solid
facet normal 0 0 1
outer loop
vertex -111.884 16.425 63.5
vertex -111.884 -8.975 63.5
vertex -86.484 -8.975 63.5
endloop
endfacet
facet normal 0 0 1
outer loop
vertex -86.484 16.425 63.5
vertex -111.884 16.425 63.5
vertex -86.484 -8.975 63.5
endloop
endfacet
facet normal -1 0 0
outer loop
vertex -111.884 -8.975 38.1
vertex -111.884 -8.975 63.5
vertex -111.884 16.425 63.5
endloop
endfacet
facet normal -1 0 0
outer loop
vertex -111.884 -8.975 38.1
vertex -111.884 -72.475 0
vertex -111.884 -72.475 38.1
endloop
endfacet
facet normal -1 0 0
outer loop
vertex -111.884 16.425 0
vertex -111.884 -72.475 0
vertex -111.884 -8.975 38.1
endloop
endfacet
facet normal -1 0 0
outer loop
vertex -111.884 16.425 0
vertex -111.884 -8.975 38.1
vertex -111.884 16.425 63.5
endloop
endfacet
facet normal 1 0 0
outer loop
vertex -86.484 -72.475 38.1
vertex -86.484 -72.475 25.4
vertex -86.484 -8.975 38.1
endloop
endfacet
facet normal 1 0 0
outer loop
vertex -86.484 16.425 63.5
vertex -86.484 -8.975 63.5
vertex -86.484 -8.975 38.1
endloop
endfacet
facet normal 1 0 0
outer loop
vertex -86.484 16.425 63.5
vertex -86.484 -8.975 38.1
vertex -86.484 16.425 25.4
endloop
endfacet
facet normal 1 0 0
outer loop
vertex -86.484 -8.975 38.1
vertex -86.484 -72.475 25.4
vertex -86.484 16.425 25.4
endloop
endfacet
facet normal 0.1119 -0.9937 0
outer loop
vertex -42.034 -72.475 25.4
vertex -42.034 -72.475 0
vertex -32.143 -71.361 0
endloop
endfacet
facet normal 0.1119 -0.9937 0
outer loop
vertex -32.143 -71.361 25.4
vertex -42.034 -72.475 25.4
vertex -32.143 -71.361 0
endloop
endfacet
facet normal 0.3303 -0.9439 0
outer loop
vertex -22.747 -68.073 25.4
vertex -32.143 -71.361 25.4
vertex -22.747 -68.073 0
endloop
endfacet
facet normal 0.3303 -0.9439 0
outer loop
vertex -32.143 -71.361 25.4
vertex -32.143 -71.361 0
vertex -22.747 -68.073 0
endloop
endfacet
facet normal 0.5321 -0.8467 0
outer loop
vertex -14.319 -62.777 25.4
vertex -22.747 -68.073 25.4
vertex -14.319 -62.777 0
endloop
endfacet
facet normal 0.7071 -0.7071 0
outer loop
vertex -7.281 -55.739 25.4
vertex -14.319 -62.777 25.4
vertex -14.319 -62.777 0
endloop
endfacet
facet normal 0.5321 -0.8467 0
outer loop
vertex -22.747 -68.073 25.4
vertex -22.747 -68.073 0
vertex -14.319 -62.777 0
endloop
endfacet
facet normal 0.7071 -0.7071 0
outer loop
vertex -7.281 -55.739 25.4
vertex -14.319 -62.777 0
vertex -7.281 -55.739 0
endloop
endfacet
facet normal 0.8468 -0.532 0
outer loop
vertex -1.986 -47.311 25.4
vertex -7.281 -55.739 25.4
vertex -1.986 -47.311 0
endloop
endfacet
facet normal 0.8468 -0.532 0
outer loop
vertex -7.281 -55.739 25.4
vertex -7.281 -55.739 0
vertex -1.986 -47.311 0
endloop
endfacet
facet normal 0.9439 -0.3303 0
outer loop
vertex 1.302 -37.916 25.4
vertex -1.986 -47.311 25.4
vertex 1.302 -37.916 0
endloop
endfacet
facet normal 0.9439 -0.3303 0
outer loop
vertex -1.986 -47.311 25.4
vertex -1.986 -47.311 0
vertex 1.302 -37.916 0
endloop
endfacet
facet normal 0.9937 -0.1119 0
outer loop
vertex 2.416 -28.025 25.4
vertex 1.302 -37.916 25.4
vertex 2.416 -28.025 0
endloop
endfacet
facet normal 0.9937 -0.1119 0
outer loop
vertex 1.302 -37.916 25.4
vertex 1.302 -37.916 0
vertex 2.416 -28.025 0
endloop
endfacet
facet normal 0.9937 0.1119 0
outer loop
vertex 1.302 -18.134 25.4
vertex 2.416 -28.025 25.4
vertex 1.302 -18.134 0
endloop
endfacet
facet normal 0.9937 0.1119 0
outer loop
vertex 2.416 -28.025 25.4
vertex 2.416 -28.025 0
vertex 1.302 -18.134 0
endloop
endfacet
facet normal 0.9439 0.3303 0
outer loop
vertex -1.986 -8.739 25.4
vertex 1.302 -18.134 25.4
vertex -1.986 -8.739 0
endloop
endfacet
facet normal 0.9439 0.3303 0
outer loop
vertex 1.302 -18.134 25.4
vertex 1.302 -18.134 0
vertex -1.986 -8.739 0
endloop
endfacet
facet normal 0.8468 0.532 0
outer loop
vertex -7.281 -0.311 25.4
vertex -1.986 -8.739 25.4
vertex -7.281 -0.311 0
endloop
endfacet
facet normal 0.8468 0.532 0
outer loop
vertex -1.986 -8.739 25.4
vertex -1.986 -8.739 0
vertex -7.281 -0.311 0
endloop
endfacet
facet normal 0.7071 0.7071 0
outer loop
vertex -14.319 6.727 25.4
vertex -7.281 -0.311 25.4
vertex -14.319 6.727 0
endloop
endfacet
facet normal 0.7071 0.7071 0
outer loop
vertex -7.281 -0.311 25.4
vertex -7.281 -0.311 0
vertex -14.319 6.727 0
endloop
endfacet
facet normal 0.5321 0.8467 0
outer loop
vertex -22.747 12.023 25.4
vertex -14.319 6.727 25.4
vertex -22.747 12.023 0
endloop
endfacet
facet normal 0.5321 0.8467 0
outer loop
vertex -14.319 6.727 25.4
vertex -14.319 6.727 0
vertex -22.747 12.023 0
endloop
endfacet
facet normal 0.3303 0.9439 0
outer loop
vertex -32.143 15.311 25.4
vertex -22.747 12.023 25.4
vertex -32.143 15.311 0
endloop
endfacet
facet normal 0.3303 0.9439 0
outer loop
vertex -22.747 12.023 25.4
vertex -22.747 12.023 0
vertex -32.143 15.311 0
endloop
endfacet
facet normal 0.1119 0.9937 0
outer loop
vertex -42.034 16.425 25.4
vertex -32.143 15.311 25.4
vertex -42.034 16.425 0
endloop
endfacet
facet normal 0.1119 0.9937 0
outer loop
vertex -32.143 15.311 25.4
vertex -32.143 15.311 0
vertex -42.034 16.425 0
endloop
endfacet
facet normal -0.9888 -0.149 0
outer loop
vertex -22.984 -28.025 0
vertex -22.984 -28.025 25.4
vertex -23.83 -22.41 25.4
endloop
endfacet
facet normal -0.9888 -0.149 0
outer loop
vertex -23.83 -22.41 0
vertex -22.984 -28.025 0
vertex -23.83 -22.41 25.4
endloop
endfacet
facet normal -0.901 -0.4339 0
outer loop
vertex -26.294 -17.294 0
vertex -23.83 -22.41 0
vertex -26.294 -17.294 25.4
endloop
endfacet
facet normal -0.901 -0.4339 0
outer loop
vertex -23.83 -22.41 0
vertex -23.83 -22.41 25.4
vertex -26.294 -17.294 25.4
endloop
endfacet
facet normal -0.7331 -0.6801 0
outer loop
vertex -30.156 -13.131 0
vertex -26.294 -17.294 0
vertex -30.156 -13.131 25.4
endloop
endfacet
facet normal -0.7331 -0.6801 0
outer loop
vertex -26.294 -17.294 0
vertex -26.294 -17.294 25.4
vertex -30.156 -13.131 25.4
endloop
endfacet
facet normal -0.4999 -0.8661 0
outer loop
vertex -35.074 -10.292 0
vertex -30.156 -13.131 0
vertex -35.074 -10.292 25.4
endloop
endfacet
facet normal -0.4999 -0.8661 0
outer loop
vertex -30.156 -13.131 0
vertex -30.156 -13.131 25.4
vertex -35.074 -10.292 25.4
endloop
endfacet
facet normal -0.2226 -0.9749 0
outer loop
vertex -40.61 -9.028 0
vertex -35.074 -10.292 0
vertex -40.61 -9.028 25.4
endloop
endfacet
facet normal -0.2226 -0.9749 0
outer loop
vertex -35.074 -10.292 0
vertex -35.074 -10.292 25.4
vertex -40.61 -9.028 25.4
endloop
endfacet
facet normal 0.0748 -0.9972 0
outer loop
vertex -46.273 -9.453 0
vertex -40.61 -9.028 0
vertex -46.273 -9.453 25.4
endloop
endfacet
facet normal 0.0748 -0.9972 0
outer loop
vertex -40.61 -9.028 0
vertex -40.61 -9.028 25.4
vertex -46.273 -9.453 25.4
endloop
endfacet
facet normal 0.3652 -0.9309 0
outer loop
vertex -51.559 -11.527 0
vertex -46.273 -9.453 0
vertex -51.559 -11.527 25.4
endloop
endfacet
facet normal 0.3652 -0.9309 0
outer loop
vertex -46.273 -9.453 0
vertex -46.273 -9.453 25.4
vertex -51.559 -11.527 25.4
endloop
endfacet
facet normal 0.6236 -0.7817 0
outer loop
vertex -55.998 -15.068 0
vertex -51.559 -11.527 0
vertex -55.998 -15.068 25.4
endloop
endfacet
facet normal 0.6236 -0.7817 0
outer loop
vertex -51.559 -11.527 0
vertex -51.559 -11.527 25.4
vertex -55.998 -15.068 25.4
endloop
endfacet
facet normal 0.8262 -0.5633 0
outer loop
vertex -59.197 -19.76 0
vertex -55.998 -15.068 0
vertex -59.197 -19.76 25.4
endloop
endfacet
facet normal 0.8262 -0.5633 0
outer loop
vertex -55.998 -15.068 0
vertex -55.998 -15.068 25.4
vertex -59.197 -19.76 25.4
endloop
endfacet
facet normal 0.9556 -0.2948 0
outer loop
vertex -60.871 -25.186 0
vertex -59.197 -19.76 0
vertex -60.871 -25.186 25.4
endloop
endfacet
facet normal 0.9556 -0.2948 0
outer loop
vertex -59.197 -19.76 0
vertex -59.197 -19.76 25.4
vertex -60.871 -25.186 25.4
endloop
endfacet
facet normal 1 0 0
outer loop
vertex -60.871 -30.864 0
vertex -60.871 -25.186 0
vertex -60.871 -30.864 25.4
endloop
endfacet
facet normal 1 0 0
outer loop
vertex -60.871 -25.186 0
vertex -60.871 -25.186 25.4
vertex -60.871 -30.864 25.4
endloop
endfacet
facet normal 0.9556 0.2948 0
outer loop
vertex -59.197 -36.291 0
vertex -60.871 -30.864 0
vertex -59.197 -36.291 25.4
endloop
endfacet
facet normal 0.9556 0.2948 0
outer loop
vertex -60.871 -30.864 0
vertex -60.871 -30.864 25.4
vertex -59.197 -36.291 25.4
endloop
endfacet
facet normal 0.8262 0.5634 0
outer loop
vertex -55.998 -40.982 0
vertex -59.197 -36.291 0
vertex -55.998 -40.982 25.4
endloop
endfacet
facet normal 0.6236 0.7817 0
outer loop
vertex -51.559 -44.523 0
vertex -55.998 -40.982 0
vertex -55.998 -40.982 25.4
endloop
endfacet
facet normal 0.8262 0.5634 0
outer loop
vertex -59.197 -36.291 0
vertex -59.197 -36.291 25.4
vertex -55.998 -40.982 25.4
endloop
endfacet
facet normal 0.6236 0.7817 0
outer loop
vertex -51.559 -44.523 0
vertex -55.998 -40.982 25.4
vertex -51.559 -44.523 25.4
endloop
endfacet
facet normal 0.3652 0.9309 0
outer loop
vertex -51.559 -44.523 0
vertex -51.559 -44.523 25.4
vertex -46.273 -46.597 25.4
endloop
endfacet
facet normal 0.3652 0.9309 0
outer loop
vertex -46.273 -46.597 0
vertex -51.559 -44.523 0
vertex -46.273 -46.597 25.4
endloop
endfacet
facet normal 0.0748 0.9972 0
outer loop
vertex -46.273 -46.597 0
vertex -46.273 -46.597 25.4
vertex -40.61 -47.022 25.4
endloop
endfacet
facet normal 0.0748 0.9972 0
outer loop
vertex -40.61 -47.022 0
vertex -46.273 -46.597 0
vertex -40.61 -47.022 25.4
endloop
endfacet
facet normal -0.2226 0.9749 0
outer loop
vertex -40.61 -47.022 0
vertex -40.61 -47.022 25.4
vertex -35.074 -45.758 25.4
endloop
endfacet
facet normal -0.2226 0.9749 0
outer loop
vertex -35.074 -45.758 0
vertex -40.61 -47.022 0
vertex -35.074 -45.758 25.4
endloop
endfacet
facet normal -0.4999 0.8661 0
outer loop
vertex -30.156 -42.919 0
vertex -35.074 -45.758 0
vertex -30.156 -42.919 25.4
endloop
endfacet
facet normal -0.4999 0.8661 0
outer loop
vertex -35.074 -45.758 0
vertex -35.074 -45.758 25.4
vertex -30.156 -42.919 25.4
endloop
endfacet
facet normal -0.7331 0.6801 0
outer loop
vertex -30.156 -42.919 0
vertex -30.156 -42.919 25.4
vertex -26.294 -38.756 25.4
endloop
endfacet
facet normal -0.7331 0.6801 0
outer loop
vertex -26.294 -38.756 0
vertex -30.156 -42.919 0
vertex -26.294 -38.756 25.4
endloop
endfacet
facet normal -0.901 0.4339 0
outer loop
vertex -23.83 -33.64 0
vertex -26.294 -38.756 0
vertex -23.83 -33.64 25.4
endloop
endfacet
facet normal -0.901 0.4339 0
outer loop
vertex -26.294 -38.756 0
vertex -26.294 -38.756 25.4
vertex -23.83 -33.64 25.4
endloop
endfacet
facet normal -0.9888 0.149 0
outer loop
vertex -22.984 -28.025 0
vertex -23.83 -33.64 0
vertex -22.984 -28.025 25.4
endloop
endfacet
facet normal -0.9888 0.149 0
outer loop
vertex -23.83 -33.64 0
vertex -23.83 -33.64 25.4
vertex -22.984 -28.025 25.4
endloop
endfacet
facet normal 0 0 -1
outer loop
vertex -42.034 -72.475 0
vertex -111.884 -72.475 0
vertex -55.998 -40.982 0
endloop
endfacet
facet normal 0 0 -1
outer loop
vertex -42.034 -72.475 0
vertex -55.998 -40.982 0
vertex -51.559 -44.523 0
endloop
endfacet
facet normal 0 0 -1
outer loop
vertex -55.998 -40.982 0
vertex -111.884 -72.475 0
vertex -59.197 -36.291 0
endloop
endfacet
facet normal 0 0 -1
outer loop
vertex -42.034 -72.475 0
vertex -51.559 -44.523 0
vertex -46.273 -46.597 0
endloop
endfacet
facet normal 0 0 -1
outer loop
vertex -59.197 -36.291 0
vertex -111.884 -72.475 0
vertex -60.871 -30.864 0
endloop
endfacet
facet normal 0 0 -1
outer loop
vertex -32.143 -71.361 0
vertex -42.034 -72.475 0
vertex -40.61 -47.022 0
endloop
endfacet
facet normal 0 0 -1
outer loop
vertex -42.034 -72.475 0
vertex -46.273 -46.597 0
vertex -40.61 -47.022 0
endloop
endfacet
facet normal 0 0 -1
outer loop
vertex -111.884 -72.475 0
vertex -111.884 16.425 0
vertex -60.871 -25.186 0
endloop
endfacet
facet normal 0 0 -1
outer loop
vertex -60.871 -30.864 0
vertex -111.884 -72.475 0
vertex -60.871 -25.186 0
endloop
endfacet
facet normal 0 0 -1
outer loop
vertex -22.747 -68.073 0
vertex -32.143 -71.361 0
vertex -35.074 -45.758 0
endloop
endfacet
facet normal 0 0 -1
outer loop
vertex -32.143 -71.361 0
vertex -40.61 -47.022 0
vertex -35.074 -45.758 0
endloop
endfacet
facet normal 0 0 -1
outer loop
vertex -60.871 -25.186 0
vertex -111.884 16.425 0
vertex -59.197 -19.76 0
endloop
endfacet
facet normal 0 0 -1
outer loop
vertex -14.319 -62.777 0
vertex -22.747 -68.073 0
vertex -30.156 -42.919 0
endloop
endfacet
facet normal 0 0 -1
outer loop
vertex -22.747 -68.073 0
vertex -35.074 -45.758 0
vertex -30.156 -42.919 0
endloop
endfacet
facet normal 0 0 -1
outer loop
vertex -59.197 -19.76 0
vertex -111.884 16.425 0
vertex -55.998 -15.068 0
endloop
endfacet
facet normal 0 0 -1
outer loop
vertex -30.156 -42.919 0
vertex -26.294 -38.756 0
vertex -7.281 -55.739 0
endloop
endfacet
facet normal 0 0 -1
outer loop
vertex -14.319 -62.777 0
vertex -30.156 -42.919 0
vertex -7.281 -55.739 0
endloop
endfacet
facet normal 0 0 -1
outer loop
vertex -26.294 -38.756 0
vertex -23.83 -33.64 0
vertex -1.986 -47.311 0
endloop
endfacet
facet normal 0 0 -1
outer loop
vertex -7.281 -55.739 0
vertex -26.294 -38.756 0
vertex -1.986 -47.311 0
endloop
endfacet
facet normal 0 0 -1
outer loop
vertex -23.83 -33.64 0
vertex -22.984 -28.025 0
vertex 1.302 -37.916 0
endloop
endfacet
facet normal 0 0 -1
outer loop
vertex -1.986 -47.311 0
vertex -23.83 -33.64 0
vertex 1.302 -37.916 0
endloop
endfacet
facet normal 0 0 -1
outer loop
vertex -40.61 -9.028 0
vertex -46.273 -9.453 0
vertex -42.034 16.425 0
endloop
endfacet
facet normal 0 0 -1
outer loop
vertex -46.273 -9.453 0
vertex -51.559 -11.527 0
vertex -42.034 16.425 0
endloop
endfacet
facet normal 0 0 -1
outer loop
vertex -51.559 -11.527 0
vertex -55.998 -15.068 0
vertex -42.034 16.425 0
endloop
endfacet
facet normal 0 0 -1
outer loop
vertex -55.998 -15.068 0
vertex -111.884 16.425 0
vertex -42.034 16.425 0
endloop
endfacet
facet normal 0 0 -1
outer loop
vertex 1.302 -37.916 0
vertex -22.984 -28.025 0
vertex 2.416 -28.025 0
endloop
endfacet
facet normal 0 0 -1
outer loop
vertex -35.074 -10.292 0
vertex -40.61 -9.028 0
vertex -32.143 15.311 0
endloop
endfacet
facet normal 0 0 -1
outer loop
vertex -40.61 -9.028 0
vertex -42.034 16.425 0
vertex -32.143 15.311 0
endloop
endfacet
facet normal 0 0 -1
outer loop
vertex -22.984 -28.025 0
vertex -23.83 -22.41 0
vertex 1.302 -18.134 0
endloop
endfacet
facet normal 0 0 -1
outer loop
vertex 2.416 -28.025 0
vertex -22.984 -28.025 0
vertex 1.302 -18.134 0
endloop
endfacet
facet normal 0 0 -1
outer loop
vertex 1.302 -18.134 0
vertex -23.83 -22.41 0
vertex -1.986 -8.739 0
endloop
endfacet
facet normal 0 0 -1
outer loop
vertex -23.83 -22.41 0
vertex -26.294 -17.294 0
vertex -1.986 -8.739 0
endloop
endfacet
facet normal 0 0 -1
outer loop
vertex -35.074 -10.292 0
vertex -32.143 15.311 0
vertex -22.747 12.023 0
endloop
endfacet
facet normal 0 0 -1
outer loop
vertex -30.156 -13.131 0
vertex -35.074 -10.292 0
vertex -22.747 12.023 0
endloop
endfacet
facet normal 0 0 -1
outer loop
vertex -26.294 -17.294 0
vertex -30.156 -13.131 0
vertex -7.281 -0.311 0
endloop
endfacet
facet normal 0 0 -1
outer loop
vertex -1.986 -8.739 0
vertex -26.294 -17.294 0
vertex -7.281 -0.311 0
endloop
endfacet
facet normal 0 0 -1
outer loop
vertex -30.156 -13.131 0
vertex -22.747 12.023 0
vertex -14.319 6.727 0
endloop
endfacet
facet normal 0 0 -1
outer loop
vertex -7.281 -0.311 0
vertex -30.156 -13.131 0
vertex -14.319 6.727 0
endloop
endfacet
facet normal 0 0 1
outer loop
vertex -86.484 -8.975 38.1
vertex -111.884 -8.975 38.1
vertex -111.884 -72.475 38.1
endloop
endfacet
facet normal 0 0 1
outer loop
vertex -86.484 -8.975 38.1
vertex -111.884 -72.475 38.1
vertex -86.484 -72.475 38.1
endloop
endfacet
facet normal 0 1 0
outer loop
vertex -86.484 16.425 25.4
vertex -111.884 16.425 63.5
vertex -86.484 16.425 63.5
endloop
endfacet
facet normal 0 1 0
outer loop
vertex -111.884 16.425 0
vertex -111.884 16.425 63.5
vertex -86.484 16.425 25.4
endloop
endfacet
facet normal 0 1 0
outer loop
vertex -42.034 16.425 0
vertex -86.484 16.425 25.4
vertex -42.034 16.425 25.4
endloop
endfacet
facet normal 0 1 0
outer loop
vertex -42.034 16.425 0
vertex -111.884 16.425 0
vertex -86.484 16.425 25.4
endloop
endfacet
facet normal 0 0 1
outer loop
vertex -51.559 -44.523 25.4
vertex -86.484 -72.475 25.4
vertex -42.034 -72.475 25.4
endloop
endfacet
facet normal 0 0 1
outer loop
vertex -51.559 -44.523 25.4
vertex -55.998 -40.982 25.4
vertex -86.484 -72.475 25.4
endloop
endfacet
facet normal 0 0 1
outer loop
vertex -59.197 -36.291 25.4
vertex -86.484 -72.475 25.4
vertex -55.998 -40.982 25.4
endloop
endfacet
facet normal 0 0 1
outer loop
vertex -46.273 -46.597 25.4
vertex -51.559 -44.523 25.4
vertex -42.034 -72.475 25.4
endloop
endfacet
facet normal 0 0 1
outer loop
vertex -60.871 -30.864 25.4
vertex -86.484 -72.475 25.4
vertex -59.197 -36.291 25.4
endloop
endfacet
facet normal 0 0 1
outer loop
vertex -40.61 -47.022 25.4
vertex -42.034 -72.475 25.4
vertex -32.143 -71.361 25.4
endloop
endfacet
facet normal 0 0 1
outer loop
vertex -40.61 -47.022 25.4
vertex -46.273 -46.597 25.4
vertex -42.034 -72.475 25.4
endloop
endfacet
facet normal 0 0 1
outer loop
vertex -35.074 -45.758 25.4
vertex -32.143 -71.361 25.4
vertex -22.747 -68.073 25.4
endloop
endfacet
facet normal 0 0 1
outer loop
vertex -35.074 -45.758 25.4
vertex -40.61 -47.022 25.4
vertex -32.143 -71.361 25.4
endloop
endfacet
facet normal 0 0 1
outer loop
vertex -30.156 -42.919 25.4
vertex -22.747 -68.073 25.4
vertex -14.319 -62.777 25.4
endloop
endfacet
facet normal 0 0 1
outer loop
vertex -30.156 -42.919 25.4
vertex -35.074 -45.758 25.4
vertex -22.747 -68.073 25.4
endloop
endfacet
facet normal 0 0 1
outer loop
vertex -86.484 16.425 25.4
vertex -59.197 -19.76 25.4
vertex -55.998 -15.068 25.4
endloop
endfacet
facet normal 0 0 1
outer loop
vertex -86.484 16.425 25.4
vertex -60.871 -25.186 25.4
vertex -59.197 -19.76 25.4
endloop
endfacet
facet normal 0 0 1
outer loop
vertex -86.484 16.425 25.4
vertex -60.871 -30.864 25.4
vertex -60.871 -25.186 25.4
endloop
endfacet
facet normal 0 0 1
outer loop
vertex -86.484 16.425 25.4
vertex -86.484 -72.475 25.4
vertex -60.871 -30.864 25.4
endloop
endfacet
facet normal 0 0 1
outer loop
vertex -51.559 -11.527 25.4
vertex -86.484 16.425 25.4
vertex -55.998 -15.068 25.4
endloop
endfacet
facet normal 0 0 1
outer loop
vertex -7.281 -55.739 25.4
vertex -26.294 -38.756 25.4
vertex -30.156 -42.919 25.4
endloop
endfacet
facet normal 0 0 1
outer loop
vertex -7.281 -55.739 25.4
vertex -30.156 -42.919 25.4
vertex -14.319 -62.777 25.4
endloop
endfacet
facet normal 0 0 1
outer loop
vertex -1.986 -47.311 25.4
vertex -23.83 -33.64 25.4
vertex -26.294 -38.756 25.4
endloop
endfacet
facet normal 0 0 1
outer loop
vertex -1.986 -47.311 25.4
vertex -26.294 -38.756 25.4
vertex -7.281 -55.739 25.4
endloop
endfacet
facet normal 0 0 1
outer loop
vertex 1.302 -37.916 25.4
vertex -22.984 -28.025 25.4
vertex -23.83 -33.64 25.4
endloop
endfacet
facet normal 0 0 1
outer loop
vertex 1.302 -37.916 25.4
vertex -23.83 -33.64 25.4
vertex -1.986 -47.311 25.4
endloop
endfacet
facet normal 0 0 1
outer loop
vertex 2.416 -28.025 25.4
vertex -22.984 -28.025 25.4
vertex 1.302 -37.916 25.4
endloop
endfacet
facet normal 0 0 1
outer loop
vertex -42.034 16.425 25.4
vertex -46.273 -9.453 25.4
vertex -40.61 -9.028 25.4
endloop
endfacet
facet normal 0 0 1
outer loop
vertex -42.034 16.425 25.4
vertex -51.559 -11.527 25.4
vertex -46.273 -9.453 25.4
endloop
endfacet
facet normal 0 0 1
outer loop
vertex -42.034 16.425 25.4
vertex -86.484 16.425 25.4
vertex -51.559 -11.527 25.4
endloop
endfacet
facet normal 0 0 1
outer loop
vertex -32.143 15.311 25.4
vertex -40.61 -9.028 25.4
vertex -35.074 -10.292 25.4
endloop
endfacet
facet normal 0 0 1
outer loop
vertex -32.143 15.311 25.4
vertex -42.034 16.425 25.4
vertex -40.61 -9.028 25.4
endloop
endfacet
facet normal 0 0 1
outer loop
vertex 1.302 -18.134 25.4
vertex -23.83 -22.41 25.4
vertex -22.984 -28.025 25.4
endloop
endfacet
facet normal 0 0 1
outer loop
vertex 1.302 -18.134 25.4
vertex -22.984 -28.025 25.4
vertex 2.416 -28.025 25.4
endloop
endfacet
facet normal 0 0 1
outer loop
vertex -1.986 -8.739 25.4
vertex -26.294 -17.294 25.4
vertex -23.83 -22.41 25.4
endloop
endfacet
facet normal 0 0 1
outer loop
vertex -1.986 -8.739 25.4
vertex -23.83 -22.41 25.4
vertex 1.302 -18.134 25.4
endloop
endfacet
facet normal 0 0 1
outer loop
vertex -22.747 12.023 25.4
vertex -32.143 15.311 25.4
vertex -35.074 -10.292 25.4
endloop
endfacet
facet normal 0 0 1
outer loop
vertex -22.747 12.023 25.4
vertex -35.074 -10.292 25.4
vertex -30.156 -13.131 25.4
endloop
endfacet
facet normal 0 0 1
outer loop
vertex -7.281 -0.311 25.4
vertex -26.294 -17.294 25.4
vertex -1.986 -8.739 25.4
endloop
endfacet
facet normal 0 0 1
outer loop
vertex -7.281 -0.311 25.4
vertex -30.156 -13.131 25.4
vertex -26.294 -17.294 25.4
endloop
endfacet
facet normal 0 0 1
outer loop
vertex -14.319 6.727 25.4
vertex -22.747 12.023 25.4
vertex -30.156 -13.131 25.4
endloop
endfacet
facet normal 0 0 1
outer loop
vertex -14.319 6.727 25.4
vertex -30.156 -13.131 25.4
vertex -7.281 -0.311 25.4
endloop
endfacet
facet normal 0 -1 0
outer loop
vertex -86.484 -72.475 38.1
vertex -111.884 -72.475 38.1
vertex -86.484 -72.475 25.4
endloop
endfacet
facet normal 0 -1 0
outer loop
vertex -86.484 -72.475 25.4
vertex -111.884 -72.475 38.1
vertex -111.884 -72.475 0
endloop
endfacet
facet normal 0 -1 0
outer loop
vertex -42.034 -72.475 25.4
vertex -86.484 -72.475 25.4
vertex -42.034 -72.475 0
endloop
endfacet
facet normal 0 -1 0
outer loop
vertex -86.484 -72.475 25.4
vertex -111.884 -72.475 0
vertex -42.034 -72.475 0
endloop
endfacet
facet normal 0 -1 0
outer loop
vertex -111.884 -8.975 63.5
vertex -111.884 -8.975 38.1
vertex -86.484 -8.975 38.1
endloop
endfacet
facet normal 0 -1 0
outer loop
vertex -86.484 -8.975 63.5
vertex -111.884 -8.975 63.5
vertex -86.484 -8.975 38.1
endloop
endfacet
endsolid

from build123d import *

# Parameters (mm, degrees)
F0_W     = 25.4
F0_H     = 88.9
F1_DEPTH = 25.4
F2_W     = 25.4
F2_H     = 25.4
F3_DEPTH = 38.1
F4_W     = 25.4
F4_H     = 63.5
F5_DEPTH = 12.7
F6_R     = 19.05
F7_DEPTH = 25.4


with BuildPart() as f1:
    # F0 (on Top) → F1 (new body)
    with BuildSketch(Plane.XY):
        with Locations((-99.183585, -28.025017)):
            Rectangle(F0_W, F0_H)
        with BuildLine():
            Line((-42.033585, 16.424983), (-86.483585, 16.424983))
            Line((-86.483585, 16.424983), (-86.483585, -72.475017))
            Line((-86.483585, -72.475017), (-42.033585, -72.475017))
            ThreePointArc((-42.033585, -72.475017), (2.416415, -28.025017), (-42.033585, 16.424983))
        make_face()
    extrude(amount=F1_DEPTH)

    # F2 (on face) → F3 (join)
    with BuildSketch(Plane.XY.offset(25.4)):
        with Locations((-99.183585, 3.724983)):
            Rectangle(F2_W, F2_H)
    extrude(amount=F3_DEPTH)

    # F4 (on face) → F5 (join)
    with BuildSketch(Plane.XY.offset(25.4)):
        with Locations((-99.183585, -40.725017)):
            Rectangle(F4_W, F4_H)
    extrude(amount=F5_DEPTH)

    # F6 (on face) → F7 (cut)
    with BuildSketch(Plane.XY.offset(25.4)):
        with Locations((-42.033585, -28.025017)):
            Circle(F6_R)
    extrude(amount=-F7_DEPTH, mode=Mode.SUBTRACT)


solid = f1.part
